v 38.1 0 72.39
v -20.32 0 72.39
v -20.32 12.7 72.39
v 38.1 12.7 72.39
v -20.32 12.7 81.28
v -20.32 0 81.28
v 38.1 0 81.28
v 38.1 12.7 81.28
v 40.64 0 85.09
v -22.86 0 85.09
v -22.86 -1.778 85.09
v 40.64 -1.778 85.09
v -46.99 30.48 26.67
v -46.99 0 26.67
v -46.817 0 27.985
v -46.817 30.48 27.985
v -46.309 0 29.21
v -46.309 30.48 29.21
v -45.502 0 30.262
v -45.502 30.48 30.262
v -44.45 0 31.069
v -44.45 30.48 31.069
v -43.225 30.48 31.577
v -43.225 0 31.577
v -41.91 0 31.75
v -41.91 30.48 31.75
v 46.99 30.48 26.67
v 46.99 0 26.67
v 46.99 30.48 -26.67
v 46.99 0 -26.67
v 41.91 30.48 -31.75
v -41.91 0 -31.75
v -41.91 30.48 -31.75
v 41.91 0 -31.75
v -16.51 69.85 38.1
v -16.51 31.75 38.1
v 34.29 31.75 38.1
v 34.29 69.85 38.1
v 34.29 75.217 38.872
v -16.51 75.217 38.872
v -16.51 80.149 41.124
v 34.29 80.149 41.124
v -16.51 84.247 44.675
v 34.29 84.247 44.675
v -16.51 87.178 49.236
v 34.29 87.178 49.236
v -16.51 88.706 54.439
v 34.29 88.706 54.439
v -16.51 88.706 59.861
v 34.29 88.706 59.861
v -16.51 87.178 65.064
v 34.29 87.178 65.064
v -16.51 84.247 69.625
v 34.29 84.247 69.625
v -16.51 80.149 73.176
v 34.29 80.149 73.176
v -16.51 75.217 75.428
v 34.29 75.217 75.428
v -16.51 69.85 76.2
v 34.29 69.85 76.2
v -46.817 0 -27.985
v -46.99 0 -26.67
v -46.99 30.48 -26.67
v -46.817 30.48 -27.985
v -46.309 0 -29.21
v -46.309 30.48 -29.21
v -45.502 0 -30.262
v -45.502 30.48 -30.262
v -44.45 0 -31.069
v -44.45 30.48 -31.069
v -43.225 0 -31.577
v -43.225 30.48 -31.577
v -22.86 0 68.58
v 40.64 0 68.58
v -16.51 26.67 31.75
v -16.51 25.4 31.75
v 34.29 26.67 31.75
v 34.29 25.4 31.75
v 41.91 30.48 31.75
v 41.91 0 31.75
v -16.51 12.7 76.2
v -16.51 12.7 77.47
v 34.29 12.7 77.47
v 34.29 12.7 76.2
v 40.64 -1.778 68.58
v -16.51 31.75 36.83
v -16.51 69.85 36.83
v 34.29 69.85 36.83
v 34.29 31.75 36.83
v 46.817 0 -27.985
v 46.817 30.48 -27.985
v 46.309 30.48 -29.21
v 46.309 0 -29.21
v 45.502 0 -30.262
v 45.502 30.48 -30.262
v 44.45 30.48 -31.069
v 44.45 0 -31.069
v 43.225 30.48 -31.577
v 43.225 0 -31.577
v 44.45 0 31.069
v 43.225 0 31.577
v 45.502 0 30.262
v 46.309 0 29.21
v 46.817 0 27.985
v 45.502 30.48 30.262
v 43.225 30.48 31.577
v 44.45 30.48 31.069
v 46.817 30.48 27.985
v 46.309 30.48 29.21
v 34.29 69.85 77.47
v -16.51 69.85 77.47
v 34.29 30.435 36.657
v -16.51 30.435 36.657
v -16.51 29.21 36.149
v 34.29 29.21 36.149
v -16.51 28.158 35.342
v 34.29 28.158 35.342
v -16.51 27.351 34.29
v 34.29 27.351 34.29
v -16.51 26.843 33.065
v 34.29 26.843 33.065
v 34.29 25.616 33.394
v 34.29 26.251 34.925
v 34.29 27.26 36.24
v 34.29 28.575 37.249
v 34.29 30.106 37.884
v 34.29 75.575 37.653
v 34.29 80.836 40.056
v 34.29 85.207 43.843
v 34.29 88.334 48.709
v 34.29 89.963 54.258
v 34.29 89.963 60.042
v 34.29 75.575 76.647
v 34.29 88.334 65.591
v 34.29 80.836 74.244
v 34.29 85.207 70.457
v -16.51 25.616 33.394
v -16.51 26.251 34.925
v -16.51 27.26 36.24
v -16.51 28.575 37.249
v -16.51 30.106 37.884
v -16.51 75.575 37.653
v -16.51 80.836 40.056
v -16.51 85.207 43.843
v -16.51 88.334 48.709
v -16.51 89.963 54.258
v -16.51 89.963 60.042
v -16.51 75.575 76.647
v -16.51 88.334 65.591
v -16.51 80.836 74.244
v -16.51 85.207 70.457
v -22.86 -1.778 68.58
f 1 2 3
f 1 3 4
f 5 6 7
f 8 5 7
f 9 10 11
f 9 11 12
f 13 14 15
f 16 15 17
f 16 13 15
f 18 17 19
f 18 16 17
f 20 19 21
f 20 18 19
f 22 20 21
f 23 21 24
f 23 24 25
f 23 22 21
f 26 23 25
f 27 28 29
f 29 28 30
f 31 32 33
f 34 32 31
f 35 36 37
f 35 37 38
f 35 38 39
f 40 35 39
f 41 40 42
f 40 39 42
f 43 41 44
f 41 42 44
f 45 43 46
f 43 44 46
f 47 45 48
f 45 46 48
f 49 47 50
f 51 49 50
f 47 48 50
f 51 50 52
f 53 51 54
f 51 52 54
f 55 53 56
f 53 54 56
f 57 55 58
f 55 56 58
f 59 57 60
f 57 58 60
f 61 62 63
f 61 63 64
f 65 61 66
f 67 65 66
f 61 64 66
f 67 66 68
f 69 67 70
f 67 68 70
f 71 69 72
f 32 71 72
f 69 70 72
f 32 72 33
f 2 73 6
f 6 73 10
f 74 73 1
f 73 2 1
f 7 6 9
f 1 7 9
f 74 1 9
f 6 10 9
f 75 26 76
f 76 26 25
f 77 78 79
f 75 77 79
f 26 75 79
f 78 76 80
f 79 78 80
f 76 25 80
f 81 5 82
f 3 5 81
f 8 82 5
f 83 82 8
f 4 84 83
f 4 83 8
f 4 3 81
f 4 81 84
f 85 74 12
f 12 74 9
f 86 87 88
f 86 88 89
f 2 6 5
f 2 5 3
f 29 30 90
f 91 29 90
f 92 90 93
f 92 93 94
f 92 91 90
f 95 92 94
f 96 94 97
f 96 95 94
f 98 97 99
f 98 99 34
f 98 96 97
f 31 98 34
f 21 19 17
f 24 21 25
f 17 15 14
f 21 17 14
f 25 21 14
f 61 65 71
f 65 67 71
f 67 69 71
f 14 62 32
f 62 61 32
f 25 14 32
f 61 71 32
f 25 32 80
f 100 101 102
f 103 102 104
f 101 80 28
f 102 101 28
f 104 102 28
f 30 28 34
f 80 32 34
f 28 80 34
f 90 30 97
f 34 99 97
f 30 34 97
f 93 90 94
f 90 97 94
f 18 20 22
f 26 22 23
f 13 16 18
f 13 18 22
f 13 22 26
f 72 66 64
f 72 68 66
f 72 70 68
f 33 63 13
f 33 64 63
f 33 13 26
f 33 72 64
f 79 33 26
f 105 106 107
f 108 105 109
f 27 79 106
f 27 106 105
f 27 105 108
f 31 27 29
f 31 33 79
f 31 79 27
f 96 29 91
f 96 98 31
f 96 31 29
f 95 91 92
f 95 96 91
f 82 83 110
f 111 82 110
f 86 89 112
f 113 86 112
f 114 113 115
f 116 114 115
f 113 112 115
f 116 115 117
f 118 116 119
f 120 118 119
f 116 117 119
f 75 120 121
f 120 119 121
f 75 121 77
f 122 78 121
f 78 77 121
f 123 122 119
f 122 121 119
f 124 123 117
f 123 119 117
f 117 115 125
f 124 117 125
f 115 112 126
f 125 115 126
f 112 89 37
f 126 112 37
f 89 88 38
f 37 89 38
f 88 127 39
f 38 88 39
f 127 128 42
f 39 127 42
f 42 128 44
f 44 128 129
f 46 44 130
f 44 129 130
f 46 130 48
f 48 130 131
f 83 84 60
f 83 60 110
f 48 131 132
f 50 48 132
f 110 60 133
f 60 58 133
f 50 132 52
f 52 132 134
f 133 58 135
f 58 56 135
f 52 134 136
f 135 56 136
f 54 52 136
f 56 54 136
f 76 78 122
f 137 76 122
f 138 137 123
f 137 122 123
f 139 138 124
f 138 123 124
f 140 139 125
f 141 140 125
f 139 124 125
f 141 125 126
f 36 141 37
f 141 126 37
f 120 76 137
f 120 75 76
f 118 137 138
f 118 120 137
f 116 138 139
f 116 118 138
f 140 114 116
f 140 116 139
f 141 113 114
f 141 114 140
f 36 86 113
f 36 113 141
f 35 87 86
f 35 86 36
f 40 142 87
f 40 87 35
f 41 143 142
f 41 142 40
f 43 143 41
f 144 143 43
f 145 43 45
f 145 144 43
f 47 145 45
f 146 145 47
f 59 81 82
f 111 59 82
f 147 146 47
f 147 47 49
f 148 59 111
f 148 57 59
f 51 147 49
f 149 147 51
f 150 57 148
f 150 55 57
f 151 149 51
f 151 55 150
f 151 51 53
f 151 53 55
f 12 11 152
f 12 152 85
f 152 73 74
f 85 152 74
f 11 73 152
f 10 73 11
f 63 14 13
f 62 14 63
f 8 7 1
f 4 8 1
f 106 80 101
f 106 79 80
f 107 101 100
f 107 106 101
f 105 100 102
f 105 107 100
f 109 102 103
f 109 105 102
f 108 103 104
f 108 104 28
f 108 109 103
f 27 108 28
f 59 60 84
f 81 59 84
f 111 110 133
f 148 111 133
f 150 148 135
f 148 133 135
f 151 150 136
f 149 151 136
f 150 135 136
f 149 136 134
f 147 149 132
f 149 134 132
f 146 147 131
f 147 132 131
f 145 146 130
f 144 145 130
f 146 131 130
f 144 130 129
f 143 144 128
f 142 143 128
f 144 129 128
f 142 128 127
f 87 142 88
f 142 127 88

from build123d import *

# Parameters (mm, degrees)
SKETCH1_W           = 93.98
SKETCH1_H           = 63.5
BOSS_EXTRUDE1_DEPTH = 30.48
FILLET1_R           = 5.08
BOSS_EXTRUDE2_START = -12.7
BOSS_EXTRUDE2_DEPTH = 50.8
SKETCH4_W           = 63.5
SKETCH4_H           = 16.51
BOSS_EXTRUDE3_DEPTH = 1.778
SKETCH5_W           = 58.42
SKETCH5_H           = 8.89
BOSS_EXTRUDE4_DEPTH = 12.7


with BuildPart() as part:
    # Sketch1 → Boss-Extrude1 (new body)
    with BuildSketch(Plane(origin=(0, 0, 0), x_dir=(1, 0, 0), z_dir=(0, 1, 0))):
        Rectangle(SKETCH1_W, SKETCH1_H)
    extrude(amount=BOSS_EXTRUDE1_DEPTH)

    # Fillet1
    fillet1_edges = [part.edges().sort_by_distance(p)[0] for p in [
        (46.99, 15.24, 31.75),
        (-46.99, 15.24, 31.75),
        (-46.99, 15.24, -31.75),
        (46.99, 15.24, -31.75),
    ]]
    fillet(fillet1_edges, radius=FILLET1_R)

    # Sketch2 → Boss-Extrude2 (add)
    with BuildSketch(Plane(origin=(46.99, 0, 0), x_dir=(0, 0, -1), z_dir=(1, 0, 0)).offset(BOSS_EXTRUDE2_START)):
        with BuildLine():
            Line((-38.1, 31.75), (-38.1, 69.85))
            ThreePointArc((-38.1, 69.85), (-57.15, 88.9), (-76.2, 69.85))
            Line((-76.2, 69.85), (-76.2, 0))
            Line((-76.2, 0), (-77.47, 0))
            Line((-77.47, 0), (-77.47, 69.85))
            ThreePointArc((-77.47, 69.85), (-57.15, 90.17), (-36.83, 69.85))
            Line((-36.83, 69.85), (-36.83, 31.75))
            ThreePointArc((-36.83, 31.75), (-35.342102448, 28.157897552), (-31.75, 26.67))
            Line((-31.75, 26.67), (-31.75, 25.4))
            ThreePointArc((-31.75, 25.4), (-36.240128061, 27.259871939), (-38.1, 31.75))
        make_face()
    extrude(amount=-BOSS_EXTRUDE2_DEPTH)

    # Sketch4 → Boss-Extrude3 (add)
    with BuildSketch(Plane.XZ):
        with Locations((8.89, 76.835)):
            Rectangle(SKETCH4_W, SKETCH4_H)
    extrude(amount=BOSS_EXTRUDE3_DEPTH)

    # Sketch5 → Boss-Extrude4 (add)
    with BuildSketch(Plane(origin=(0, 0, 0), x_dir=(1, 0, 0), z_dir=(0, 1, 0))):
        with Locations((8.89, -76.835)):
            Rectangle(SKETCH5_W, SKETCH5_H)
    extrude(amount=BOSS_EXTRUDE4_DEPTH)


solid = part.part
